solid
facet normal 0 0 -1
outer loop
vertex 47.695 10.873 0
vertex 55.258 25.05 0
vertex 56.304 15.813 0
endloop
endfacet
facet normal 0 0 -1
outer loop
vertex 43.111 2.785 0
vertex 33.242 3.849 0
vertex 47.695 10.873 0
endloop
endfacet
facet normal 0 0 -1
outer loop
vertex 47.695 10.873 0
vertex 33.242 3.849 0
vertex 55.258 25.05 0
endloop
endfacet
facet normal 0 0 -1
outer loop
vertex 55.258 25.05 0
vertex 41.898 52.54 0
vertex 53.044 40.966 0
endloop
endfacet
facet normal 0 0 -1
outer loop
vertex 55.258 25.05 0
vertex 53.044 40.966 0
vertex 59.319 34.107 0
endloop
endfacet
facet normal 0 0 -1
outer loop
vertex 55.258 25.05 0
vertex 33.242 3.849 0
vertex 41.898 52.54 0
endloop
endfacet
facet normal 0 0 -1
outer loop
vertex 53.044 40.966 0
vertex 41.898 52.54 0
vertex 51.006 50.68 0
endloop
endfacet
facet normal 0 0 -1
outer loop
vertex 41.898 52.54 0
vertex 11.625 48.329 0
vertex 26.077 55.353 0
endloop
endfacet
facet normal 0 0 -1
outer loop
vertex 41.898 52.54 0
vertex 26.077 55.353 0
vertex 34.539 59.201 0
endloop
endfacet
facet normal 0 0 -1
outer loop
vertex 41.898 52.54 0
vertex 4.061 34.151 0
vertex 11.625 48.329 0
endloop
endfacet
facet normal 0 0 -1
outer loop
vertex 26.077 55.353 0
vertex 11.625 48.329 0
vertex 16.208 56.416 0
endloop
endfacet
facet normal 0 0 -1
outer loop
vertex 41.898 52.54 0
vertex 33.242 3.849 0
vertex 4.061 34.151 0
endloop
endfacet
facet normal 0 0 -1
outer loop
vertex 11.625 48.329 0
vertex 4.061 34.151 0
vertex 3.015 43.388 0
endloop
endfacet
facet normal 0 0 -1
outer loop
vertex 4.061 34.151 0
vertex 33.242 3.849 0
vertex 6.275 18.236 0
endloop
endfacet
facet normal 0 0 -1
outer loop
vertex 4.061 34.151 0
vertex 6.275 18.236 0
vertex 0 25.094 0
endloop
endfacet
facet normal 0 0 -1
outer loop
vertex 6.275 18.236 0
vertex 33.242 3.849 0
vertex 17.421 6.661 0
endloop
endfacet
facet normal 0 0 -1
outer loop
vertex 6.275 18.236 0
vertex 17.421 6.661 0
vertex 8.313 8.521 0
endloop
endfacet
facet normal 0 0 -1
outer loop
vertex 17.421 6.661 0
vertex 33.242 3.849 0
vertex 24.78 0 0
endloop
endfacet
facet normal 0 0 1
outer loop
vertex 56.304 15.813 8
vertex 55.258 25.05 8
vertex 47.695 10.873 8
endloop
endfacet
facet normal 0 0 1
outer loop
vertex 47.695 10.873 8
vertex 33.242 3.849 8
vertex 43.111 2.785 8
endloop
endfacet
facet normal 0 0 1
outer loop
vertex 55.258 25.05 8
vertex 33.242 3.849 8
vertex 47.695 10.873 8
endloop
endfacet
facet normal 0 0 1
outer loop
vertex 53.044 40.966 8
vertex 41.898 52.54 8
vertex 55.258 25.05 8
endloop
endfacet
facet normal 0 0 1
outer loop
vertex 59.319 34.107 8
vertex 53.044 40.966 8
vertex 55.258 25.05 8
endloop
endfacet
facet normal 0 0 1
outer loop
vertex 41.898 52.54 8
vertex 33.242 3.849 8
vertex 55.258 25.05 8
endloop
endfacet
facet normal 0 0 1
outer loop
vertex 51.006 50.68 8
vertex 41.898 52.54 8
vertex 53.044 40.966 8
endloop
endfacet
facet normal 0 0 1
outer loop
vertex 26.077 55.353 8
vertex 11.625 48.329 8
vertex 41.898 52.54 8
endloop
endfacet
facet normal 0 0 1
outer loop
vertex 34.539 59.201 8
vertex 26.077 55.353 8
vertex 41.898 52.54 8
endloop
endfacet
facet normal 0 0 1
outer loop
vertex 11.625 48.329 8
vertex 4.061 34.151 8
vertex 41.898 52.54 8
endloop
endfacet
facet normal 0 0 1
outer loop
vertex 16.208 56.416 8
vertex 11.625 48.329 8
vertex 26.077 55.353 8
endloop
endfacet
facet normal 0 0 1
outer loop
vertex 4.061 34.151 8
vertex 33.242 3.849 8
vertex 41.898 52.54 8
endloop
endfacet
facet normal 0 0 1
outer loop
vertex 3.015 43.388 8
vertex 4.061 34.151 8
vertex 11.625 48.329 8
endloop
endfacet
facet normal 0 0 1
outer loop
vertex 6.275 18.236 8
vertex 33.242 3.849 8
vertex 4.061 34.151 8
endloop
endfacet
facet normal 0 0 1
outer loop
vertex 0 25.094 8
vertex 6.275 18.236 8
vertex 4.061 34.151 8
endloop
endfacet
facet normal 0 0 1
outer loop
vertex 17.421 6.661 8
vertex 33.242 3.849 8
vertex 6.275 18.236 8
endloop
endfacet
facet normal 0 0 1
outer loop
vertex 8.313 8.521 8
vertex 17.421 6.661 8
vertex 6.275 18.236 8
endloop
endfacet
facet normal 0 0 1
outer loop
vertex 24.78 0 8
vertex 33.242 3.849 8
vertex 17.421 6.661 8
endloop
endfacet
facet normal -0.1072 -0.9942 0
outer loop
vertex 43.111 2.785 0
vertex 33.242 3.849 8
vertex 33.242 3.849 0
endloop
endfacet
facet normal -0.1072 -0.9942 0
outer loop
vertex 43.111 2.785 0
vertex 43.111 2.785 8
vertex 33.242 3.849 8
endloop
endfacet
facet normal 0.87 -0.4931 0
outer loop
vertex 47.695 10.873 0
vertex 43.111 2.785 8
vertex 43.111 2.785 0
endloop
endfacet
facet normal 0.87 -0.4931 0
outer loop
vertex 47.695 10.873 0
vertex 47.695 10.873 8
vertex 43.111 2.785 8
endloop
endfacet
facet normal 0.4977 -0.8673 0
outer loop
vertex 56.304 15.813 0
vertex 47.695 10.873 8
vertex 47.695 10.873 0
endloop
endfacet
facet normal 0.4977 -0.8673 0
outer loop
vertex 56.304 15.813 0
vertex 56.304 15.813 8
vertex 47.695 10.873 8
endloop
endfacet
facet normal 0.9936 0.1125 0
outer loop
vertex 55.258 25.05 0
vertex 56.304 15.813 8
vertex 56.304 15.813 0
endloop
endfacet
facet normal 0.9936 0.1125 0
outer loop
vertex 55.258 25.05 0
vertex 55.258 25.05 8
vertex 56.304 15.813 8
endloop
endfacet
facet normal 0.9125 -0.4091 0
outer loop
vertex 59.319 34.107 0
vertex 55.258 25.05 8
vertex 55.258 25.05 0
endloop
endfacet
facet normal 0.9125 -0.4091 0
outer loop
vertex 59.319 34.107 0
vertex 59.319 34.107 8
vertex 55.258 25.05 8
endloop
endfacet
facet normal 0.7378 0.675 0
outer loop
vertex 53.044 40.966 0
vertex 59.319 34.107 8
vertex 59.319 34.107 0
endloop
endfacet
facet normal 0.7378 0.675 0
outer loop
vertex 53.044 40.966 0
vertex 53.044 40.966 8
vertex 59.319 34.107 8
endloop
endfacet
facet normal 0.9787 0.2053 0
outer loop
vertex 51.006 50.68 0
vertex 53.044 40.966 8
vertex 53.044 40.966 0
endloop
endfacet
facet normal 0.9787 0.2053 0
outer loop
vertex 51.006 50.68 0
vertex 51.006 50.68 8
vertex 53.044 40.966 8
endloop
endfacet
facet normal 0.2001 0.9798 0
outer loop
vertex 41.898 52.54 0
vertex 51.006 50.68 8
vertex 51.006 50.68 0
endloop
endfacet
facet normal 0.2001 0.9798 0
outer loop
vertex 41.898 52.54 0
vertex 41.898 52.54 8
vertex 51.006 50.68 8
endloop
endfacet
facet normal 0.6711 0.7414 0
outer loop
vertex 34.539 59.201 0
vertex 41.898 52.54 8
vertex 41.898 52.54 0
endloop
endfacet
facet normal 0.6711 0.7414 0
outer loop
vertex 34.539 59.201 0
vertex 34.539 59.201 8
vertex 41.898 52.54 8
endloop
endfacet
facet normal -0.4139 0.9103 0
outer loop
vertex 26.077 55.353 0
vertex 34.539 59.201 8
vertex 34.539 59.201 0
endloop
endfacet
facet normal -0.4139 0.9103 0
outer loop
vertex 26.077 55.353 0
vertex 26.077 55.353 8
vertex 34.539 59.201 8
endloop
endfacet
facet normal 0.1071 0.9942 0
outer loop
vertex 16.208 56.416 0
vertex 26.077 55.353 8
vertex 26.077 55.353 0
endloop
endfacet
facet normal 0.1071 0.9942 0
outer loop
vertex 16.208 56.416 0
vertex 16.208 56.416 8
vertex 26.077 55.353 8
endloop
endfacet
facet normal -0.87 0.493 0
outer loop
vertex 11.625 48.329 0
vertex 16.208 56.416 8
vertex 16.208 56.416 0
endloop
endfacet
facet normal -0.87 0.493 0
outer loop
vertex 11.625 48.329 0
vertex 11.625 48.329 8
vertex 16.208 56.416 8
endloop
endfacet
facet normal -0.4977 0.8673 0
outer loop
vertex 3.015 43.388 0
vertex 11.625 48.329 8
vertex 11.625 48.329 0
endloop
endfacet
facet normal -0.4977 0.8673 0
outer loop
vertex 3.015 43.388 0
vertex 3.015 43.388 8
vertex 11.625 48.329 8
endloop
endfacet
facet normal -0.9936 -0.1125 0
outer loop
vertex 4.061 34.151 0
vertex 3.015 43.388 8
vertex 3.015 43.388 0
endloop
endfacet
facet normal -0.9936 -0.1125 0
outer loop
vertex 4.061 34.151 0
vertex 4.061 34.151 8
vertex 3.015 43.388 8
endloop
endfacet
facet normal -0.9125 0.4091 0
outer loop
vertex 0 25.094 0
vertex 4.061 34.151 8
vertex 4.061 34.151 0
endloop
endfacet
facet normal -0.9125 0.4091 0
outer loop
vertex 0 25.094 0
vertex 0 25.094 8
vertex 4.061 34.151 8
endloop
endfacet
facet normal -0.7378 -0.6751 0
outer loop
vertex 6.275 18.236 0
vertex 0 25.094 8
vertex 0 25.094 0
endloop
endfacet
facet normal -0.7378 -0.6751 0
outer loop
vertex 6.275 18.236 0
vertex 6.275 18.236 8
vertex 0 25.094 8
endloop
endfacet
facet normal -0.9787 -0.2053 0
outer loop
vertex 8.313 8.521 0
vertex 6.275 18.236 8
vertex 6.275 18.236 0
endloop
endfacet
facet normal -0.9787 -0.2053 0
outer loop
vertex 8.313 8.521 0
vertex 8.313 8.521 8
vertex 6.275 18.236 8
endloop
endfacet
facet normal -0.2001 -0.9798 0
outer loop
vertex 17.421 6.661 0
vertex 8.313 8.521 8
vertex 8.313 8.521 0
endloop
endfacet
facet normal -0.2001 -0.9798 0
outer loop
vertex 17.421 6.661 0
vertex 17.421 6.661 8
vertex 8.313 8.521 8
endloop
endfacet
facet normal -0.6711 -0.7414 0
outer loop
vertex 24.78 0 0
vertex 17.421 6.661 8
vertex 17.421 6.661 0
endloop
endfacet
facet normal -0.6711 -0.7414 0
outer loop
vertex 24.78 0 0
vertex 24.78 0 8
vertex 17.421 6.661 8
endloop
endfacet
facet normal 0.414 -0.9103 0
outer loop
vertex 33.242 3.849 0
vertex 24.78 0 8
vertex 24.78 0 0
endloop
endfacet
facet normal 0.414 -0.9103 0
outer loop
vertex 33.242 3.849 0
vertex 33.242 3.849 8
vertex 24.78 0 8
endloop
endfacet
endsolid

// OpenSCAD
$fn = 32;

// ----------------------------------------------------------------------
// Chain sprocket: 10 teeth, 26 mm root radius
// ----------------------------------------------------------------------

// --- parameters (mm) ---
profile_height = 8;       // extrusion height
profile_points = 20;      // points of the closed outline

profile = [[55.258, 25.05], [59.319, 34.107], [53.044, 40.966], [51.006, 50.68], [41.898, 52.54], [34.539, 59.201], [26.077, 55.353], [16.208, 56.416], [11.625, 48.329], [3.015, 43.388], [4.061, 34.151], [0, 25.094], [6.275, 18.236], [8.313, 8.521], [17.421, 6.661], [24.78, 0], [33.242, 3.849], [43.111, 2.785], [47.695, 10.873], [56.304, 15.813]];  // single closed polygon, 20 points, counter clockwise

// --- the one profile operation ---
linear_extrude(height = profile_height) polygon(points = profile);
